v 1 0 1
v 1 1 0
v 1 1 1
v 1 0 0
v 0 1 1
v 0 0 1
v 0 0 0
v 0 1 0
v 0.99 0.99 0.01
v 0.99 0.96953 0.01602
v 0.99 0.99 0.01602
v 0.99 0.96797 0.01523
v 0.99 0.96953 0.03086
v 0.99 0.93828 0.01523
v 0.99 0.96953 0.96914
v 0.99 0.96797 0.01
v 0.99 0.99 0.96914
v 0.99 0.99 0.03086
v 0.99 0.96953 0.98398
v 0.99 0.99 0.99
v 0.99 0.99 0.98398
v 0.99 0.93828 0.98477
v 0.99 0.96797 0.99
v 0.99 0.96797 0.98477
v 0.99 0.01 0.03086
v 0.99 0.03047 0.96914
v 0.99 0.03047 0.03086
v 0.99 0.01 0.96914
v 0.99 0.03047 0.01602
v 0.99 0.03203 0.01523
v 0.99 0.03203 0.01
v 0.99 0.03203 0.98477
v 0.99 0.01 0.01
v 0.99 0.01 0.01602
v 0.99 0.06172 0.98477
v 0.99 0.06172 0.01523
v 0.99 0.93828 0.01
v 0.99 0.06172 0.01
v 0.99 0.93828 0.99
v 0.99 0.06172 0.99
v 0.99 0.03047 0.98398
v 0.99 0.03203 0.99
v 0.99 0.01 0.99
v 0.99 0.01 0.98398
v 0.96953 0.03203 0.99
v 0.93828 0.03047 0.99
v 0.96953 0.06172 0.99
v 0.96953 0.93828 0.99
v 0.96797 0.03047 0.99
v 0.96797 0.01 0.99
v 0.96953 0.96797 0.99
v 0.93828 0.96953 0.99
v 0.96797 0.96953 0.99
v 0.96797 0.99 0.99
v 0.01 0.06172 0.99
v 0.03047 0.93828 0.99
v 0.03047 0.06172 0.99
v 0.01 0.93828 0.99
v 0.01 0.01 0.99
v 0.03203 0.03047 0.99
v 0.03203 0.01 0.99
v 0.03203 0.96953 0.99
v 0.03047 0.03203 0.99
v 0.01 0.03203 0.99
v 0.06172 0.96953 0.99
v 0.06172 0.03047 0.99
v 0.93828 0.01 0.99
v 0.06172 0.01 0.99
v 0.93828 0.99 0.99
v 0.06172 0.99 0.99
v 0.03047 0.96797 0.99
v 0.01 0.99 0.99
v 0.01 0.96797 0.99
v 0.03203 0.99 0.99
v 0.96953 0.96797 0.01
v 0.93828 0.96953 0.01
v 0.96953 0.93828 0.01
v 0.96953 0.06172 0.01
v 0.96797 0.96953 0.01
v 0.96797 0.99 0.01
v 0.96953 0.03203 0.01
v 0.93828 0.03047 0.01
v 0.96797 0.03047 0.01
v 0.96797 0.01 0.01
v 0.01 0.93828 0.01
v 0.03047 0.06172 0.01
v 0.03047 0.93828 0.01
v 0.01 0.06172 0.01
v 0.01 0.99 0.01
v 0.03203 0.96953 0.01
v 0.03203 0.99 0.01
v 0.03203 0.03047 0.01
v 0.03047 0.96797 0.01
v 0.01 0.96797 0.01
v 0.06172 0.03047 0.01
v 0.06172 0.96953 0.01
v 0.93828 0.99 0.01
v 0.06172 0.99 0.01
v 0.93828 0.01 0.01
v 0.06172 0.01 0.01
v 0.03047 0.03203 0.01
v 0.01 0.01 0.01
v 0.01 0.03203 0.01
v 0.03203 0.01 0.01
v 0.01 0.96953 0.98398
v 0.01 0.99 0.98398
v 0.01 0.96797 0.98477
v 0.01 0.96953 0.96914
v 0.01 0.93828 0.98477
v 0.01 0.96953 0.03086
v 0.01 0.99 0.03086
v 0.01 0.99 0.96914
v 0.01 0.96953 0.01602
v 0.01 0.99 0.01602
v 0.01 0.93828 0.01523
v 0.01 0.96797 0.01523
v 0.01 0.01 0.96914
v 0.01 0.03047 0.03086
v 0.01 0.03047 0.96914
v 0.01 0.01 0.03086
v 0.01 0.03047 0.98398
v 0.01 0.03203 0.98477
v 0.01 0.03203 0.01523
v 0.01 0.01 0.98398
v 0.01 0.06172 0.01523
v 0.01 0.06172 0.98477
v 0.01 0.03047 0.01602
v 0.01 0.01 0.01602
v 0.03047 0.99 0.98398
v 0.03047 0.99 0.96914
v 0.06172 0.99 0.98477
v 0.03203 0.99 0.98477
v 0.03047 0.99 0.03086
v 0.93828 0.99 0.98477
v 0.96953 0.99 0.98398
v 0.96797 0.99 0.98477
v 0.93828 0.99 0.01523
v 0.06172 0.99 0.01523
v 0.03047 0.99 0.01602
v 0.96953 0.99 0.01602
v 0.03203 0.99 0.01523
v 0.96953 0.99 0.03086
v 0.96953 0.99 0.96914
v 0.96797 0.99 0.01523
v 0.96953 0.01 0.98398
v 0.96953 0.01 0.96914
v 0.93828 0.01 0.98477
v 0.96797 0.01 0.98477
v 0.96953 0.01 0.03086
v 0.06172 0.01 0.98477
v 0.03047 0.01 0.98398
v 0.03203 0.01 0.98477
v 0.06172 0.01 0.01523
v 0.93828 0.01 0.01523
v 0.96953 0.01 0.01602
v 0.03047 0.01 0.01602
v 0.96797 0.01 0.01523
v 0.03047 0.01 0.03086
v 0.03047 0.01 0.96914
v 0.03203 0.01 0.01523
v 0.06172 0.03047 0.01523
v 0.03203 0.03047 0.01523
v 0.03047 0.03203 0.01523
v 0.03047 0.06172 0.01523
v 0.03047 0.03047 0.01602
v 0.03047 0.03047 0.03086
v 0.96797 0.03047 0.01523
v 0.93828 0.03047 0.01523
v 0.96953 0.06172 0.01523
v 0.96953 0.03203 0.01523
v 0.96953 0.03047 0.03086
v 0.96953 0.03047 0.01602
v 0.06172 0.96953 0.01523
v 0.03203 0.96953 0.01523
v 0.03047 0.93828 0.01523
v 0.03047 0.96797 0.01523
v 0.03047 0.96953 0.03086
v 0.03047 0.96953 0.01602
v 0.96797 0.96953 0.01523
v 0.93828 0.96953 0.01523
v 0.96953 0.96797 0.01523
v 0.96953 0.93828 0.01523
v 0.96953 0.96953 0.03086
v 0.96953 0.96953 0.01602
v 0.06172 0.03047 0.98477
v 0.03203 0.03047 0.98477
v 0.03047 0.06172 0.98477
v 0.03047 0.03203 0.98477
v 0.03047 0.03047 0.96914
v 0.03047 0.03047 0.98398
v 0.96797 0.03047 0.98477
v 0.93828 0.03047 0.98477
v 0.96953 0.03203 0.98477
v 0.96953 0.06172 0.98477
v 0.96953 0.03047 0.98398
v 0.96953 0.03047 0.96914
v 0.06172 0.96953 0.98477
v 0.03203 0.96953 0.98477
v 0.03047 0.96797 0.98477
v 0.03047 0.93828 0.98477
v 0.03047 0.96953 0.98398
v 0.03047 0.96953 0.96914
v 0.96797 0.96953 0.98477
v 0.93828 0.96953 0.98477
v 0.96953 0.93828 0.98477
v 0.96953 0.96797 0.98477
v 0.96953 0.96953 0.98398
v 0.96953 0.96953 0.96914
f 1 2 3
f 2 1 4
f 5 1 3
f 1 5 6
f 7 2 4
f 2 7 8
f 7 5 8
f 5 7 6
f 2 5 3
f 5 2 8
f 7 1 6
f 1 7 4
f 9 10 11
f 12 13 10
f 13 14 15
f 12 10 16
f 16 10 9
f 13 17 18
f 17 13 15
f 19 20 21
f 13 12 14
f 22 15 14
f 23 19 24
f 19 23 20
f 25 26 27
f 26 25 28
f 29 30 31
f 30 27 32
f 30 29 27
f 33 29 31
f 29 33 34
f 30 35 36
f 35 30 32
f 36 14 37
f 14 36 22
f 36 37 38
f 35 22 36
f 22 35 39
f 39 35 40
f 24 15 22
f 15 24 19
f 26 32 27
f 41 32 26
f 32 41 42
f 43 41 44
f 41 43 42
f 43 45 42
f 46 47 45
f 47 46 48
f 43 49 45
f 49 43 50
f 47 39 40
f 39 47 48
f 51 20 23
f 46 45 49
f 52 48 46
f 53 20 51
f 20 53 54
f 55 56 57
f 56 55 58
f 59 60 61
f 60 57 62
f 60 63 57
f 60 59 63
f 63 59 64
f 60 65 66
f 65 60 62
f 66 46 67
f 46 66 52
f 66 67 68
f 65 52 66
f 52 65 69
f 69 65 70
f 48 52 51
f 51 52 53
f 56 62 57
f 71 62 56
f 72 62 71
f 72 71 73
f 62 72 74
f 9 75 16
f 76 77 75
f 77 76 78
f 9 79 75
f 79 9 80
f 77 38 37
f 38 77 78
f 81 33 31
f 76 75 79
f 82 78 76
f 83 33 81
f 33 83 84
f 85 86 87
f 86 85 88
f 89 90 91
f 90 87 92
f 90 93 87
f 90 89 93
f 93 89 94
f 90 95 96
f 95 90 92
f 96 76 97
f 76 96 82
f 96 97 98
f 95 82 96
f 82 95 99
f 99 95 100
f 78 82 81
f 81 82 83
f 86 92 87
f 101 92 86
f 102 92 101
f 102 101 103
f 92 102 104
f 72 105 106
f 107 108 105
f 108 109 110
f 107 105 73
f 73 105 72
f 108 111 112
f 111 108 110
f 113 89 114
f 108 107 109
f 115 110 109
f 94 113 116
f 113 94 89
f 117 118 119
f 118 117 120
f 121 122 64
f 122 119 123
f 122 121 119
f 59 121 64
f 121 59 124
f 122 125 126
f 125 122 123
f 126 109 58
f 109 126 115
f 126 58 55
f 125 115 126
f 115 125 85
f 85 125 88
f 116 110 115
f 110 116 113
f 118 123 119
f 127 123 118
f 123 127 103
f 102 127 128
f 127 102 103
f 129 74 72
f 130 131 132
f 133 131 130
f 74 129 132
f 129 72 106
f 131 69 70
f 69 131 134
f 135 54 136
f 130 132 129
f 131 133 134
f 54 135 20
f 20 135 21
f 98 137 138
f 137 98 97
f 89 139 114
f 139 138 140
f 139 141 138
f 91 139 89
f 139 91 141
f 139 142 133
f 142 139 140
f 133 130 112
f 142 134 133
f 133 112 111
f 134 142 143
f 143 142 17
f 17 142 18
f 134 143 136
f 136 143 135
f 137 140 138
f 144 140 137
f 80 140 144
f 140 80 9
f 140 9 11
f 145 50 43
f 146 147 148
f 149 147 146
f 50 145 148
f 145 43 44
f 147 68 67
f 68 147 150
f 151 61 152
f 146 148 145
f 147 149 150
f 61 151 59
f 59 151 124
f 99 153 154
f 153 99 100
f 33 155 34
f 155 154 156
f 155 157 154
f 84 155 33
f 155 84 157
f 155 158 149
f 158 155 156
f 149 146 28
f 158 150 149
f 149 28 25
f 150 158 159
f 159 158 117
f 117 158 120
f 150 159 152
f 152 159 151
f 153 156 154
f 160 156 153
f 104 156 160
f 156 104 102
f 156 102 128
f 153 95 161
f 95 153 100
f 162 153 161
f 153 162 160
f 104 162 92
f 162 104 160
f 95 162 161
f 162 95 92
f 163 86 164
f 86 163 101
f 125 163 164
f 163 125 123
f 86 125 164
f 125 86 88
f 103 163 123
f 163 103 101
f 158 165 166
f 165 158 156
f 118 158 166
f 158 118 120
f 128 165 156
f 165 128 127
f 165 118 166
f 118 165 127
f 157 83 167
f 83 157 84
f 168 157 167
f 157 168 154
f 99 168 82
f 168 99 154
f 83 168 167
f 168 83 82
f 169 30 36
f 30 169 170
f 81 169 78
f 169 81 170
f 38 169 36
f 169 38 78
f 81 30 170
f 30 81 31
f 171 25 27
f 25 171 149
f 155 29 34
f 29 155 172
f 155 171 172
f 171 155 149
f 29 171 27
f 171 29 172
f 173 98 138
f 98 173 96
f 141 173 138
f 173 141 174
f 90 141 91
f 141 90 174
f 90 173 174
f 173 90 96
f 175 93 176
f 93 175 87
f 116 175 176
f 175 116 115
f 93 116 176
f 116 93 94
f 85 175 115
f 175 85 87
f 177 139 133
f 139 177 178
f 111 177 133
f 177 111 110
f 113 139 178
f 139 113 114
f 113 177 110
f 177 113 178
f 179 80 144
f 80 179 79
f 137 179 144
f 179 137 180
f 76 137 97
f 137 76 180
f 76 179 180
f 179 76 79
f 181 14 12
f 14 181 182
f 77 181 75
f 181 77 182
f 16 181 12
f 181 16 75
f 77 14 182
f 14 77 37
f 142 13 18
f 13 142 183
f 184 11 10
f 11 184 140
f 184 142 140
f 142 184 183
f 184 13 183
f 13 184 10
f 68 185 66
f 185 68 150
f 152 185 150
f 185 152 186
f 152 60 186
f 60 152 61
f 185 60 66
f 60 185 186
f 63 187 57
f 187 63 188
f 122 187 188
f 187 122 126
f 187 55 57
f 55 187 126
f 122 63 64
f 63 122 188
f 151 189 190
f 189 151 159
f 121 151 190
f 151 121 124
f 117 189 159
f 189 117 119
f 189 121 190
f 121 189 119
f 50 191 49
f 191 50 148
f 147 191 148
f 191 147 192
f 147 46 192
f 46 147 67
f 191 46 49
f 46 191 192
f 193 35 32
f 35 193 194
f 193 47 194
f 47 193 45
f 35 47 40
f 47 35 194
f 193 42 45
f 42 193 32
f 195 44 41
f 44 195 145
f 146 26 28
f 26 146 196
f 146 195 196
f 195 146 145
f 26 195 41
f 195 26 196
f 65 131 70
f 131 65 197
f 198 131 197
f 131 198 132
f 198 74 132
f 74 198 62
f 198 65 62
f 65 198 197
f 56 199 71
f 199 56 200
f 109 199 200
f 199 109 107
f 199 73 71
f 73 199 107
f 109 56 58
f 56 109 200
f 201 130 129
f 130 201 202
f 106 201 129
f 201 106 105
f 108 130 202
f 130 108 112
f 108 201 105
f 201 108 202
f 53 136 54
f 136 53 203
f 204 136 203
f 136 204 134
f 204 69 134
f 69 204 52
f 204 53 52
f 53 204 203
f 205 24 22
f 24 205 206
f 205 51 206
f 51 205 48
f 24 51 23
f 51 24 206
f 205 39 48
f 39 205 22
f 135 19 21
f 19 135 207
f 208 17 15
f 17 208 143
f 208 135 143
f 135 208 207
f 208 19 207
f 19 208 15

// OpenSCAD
translate([0.046875, 0.015625, 0.0078125]) color([0.8352652083788017, 0.4789645616530247, 0.8888242662849705]) cube([0.0296875, 0.0296875, 0.01484375], center=true);
translate([0.015625, 0.046875, 0.0078125]) color([0.7977003312522131, 0.4430245559395397, 0.5757872208285841]) cube([0.0296875, 0.0296875, 0.01484375], center=true);
translate([0.015625, 0.015625, 0.0234375]) color([0.18894415855786206, 0.8084526775944827, 0.5240727557148024]) cube([0.0296875, 0.0296875, 0.01484375], center=true);
translate([0.953125, 0.015625, 0.0078125]) color([0.33009817895383553, 0.6358447971330878, 0.274476683198677]) cube([0.0296875, 0.0296875, 0.01484375], center=true);
translate([0.984375, 0.046875, 0.0078125]) color([0.7036882936284021, 0.9548751840233447, 0.5755708060880032]) cube([0.0296875, 0.0296875, 0.01484375], center=true);
translate([0.984375, 0.015625, 0.0234375]) color([0.41204698353559877, 0.5796286851254486, 0.28286322414623355]) cube([0.0296875, 0.0296875, 0.01484375], center=true);
translate([0.046875, 0.984375, 0.0078125]) color([0.83488960487533, 0.7968053445508819, 0.9111606805714901]) cube([0.0296875, 0.0296875, 0.01484375], center=true);
translate([0.015625, 0.953125, 0.0078125]) color([0.24277728252059738, 0.2698201644401115, 0.25372921938475945]) cube([0.0296875, 0.0296875, 0.01484375], center=true);
translate([0.015625, 0.984375, 0.0234375]) color([0.3248429479181304, 0.33731838939050207, 0.46012102584031667]) cube([0.0296875, 0.0296875, 0.01484375], center=true);
translate([0.953125, 0.984375, 0.0078125]) color([0.4972140619467261, 0.4460540182101679, 0.582257111213957]) cube([0.0296875, 0.0296875, 0.01484375], center=true);
translate([0.984375, 0.953125, 0.0078125]) color([0.38189019333285656, 0.9329183366158048, 0.74346568951076]) cube([0.0296875, 0.0296875, 0.01484375], center=true);
translate([0.984375, 0.984375, 0.0234375]) color([0.10367473231816282, 0.6513301228797536, 0.21210212161149367]) cube([0.0296875, 0.0296875, 0.01484375], center=true);
translate([0.046875, 0.015625, 0.9921875]) color([0.4071949612628585, 0.6715659813617996, 0.17871221391606673]) cube([0.0296875, 0.0296875, 0.01484375], center=true);
translate([0.015625, 0.046875, 0.9921875]) color([0.17752412341011714, 0.6556599876579107, 0.7040052939421468]) cube([0.0296875, 0.0296875, 0.01484375], center=true);
translate([0.015625, 0.015625, 0.9765625]) color([0.9236087761692187, 0.21340315940002685, 0.5989435772305987]) cube([0.0296875, 0.0296875, 0.01484375], center=true);
translate([0.953125, 0.015625, 0.9921875]) color([0.8450733127471588, 0.6003349610680997, 0.5954496070156984]) cube([0.0296875, 0.0296875, 0.01484375], center=true);
translate([0.984375, 0.046875, 0.9921875]) color([0.920709623693076, 0.4233833186292486, 0.4754938941291812]) cube([0.0296875, 0.0296875, 0.01484375], center=true);
translate([0.984375, 0.015625, 0.9765625]) color([0.872421437716006, 0.9767589381362137, 0.9086126193256788]) cube([0.0296875, 0.0296875, 0.01484375], center=true);
translate([0.046875, 0.984375, 0.9921875]) color([0.7884233486788577, 0.8262914624918754, 0.6636415038118221]) cube([0.0296875, 0.0296875, 0.01484375], center=true);
translate([0.015625, 0.953125, 0.9921875]) color([0.36270118963089737, 0.5138414630226216, 0.14357255994509865]) cube([0.0296875, 0.0296875, 0.01484375], center=true);
translate([0.015625, 0.984375, 0.9765625]) color([0.466624584989368, 0.29734697142143796, 0.9844700368526675]) cube([0.0296875, 0.0296875, 0.01484375], center=true);
translate([0.953125, 0.984375, 0.9921875]) color([0.6752891164641136, 0.29017518075598103, 0.4342964607752302]) cube([0.0296875, 0.0296875, 0.01484375], center=true);
translate([0.984375, 0.953125, 0.9921875]) color([0.773003957160343, 0.565247166210502, 0.9239404304157245]) cube([0.0296875, 0.0296875, 0.01484375], center=true);
translate([0.984375, 0.984375, 0.9765625]) color([0.16032310979410902, 0.8355206000915061, 0.5688487402091276]) cube([0.0296875, 0.0296875, 0.01484375], center=true);
color([0.3,0.3,0.3,0.3]) difference() { cube([1,1,1]); translate([0.01,0.01,0.01]) cube([0.98,0.98,0.98]); }
